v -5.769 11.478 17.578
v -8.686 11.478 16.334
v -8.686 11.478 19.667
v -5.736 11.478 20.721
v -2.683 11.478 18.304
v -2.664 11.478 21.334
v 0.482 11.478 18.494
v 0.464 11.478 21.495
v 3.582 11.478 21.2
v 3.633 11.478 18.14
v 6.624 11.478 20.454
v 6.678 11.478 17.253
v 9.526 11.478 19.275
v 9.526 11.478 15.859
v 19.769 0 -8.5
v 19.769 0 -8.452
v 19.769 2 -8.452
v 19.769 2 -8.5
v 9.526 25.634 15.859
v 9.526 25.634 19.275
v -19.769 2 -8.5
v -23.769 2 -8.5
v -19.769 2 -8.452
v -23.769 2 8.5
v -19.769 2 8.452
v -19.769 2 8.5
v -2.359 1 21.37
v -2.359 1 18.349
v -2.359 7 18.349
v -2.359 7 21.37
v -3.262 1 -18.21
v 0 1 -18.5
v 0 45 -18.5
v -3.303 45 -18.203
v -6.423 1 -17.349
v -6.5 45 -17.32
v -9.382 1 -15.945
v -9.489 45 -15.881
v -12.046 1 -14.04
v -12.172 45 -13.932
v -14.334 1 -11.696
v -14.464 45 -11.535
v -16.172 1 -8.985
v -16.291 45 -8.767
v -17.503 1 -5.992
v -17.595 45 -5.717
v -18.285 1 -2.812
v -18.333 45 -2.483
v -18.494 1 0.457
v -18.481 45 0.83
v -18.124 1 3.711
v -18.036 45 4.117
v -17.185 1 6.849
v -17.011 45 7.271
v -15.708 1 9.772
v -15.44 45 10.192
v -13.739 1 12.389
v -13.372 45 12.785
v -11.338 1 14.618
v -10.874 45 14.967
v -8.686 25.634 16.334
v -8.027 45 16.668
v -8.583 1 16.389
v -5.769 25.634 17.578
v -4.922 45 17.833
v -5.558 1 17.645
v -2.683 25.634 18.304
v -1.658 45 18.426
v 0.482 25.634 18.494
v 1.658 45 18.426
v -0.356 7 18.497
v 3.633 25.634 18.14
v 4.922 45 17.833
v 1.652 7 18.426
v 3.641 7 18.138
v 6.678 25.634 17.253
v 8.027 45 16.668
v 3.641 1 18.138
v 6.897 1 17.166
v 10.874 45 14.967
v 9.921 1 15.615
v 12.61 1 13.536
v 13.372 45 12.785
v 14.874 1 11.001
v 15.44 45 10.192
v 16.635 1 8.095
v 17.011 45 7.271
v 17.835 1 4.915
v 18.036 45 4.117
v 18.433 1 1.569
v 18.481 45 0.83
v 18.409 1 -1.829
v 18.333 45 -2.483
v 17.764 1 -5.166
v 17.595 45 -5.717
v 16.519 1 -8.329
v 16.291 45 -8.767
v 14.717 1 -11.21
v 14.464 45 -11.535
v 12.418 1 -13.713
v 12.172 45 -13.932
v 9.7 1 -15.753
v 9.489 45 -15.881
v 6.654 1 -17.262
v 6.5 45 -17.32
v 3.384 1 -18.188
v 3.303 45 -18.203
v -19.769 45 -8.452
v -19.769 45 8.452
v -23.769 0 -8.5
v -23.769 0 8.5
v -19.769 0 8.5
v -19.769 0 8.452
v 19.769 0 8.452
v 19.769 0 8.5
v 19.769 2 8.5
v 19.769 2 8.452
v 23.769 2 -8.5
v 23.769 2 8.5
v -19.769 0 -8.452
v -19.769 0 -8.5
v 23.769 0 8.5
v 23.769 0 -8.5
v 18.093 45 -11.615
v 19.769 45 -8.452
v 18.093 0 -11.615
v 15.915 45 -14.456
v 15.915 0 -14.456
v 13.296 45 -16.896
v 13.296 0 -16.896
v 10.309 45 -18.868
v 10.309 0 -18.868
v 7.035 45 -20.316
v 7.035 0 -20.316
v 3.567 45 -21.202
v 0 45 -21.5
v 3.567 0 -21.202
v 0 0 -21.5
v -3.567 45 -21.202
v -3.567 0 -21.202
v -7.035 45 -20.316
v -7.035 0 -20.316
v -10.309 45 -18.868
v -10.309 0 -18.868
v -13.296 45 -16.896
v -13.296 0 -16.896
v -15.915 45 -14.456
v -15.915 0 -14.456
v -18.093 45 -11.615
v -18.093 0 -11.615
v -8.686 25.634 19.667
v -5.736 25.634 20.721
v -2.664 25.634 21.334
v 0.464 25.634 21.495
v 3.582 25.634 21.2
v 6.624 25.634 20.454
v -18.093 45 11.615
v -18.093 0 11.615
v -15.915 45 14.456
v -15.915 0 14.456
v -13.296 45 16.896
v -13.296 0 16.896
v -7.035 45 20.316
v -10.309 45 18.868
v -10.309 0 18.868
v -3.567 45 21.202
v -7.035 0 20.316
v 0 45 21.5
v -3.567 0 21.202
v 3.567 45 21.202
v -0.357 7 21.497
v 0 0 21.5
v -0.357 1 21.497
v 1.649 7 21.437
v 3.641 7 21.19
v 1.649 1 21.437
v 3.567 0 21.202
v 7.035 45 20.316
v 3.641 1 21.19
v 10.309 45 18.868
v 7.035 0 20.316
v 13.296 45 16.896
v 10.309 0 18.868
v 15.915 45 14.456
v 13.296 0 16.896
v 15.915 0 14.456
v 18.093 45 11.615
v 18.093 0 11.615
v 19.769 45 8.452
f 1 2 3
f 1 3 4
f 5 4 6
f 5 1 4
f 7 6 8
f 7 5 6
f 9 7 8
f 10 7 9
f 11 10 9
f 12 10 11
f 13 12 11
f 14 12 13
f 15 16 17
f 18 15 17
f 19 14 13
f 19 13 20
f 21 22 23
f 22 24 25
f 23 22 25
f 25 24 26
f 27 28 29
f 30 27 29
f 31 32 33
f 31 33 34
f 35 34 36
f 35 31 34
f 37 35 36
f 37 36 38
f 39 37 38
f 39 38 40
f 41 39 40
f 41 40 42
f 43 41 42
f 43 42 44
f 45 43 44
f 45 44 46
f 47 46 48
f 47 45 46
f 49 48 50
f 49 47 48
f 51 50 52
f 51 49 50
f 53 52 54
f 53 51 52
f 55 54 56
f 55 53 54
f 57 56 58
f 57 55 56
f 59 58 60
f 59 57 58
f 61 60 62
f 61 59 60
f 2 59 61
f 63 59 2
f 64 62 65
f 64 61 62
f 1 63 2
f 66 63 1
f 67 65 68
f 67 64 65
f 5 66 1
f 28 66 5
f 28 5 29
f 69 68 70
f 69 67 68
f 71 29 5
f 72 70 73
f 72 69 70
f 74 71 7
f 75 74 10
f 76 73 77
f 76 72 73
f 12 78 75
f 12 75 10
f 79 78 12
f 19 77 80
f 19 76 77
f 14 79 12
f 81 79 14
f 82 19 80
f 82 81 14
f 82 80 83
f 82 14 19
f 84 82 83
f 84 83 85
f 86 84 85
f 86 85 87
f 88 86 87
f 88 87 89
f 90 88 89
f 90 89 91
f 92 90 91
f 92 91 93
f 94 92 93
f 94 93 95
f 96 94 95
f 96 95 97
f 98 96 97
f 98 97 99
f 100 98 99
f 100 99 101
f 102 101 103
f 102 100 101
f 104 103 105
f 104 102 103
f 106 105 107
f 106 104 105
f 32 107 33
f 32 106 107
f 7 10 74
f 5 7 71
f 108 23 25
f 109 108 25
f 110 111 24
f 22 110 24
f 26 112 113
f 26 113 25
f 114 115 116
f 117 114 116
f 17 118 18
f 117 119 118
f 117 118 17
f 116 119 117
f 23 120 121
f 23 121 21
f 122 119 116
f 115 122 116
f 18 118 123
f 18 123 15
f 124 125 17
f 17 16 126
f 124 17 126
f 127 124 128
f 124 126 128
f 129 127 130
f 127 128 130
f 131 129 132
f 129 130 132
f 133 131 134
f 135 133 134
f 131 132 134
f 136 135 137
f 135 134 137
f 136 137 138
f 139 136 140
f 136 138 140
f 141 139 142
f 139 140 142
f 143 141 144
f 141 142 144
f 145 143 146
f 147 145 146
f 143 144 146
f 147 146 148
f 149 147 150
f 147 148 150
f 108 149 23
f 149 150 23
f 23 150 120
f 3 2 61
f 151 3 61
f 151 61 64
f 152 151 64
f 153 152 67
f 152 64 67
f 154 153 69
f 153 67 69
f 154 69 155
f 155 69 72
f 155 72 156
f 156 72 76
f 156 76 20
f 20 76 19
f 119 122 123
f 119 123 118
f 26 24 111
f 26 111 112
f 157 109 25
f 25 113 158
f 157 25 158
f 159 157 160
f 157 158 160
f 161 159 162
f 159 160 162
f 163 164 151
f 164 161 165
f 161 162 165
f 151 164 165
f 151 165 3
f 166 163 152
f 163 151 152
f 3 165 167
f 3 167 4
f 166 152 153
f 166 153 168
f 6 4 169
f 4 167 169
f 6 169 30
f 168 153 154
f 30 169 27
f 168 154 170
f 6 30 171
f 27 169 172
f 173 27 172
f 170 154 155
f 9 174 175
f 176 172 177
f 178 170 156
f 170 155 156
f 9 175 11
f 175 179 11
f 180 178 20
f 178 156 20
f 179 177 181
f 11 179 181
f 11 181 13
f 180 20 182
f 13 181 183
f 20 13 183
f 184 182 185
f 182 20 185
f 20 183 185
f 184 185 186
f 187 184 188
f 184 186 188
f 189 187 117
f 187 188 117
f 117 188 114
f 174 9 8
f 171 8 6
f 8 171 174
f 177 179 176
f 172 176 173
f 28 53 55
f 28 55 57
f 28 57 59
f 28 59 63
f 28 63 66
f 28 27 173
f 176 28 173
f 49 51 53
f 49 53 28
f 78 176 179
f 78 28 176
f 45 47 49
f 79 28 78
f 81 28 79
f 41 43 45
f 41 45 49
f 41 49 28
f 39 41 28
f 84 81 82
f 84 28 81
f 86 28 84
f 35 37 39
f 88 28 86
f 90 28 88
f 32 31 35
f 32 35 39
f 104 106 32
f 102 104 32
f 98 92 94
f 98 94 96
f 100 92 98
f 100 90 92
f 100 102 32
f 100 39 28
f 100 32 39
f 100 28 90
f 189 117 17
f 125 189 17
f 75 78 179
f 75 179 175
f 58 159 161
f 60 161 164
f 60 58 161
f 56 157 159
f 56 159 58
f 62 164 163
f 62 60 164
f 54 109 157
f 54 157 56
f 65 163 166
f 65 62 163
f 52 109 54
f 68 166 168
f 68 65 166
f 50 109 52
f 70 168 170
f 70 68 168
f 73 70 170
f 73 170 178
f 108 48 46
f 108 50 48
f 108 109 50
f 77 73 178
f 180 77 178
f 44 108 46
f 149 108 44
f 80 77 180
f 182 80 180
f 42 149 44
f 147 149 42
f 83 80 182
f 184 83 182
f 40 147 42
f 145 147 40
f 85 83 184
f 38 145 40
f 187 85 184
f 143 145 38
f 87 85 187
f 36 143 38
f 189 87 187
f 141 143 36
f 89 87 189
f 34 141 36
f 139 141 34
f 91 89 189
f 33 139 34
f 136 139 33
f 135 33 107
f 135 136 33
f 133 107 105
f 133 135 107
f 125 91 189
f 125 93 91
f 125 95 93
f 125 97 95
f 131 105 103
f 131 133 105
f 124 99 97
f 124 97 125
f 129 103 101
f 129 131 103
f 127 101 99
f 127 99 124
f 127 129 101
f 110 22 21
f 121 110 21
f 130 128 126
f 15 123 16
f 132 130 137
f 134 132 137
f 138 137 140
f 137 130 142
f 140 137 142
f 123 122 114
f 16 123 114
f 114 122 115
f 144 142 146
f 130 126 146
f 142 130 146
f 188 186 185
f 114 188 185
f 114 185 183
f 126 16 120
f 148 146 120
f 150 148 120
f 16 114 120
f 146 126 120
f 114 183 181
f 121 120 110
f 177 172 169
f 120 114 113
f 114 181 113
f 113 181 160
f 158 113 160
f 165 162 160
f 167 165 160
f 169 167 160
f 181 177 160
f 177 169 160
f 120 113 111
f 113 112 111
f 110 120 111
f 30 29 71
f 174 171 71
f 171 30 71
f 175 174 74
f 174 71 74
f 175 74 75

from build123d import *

# Parameters (mm, degrees)
SKETCH1_R               = 18.5
BOSS_EXTRUDE1_DEPTH     = 45
SKETCH1_3_R             = 18.5
BOSS_EXTRUDE2_DEPTH     = 1
CUT_EXTRUDE1_REACH      = 55.648
CUT_EXTRUDE1_END_RADIUS = 21.5
SKETCH2_W               = 6
SKETCH2_H               = 6
SKETCH2_W_2             = 18.211242215
SKETCH2_H_2             = 14.156014421
SKETCH3_W               = 4
SKETCH3_H               = 2
BOSS_EXTRUDE3_DEPTH     = 8.5


with BuildPart() as part:
    # Sketch1 → Boss-Extrude1 (new body)
    with BuildSketch(Plane(origin=(0, 0, 0), x_dir=(1, 0, 0), z_dir=(0, 1, 0))):
        with BuildLine():
            ThreePointArc((19.769048133, 8.451907235), (0, 21.5), (-19.769048133, 8.451907235))
            Line((-19.769048133, 8.451907235), (-19.769048133, -8.451907235))
            ThreePointArc((-19.769048133, -8.451907235), (0, -21.5), (19.769048133, -8.451907235))
            Line((19.769048133, -8.451907235), (19.769048133, 8.451907235))
        make_face()
        Circle(SKETCH1_R, mode=Mode.SUBTRACT)
    extrude(amount=BOSS_EXTRUDE1_DEPTH)

    # Sketch1<3> → Boss-Extrude2 (add)
    with BuildSketch(Plane(origin=(0, 0, 0), x_dir=(1, 0, 0), z_dir=(0, 1, 0))):
        Circle(SKETCH1_3_R)
    extrude(amount=BOSS_EXTRUDE2_DEPTH)

    # Cut-Extrude1: up to this cylinder (the profile starts inside it)
    cut_extrude1_end = Plane(origin=(0, 11.2781055, 0), z_dir=(0, -1, 0)) * Cylinder(CUT_EXTRUDE1_END_RADIUS, 169.852211, mode=Mode.PRIVATE)
    # Sketch2 → Cut-Extrude1 (cut, up to the surface)
    with BuildSketch(Plane.XY, mode=Mode.PRIVATE) as cut_extrude1_sk1:
        with Locations((0.640621421, 4)):
            Rectangle(SKETCH2_W, SKETCH2_H)
    cut_extrude1_tool1 = extrude(cut_extrude1_sk1.sketch, amount=CUT_EXTRUDE1_REACH, mode=Mode.PRIVATE) & cut_extrude1_end
    add(cut_extrude1_tool1.solids().sort_by_distance((0.640621, 4, 0))[0], mode=Mode.SUBTRACT)
    # Sketch2 → Cut-Extrude1 (cut, up to the surface)
    with BuildSketch(Plane.XY, mode=Mode.PRIVATE) as cut_extrude1_sk2:
        with Locations((0.419944281, 18.556211079)):
            Rectangle(SKETCH2_W_2, SKETCH2_H_2)
    cut_extrude1_tool2 = extrude(cut_extrude1_sk2.sketch, amount=CUT_EXTRUDE1_REACH, mode=Mode.PRIVATE) & cut_extrude1_end
    add(cut_extrude1_tool2.solids().sort_by_distance((0.419944, 18.556211, 0))[0], mode=Mode.SUBTRACT)

    # Sketch3 → Boss-Extrude3 (add, symmetric)
    with BuildSketch(Plane.XY):
        with Locations((-21.769048133, 1)):
            Rectangle(SKETCH3_W, SKETCH3_H)
    boss_extrude3 = extrude(amount=BOSS_EXTRUDE3_DEPTH, both=True)

    # Mirror1: Boss-Extrude3 across plane
    add(boss_extrude3.mirror(Plane(origin=(0, 0, 0), x_dir=(0, 0, 1), z_dir=(1, 0, 0))))


solid = part.part
